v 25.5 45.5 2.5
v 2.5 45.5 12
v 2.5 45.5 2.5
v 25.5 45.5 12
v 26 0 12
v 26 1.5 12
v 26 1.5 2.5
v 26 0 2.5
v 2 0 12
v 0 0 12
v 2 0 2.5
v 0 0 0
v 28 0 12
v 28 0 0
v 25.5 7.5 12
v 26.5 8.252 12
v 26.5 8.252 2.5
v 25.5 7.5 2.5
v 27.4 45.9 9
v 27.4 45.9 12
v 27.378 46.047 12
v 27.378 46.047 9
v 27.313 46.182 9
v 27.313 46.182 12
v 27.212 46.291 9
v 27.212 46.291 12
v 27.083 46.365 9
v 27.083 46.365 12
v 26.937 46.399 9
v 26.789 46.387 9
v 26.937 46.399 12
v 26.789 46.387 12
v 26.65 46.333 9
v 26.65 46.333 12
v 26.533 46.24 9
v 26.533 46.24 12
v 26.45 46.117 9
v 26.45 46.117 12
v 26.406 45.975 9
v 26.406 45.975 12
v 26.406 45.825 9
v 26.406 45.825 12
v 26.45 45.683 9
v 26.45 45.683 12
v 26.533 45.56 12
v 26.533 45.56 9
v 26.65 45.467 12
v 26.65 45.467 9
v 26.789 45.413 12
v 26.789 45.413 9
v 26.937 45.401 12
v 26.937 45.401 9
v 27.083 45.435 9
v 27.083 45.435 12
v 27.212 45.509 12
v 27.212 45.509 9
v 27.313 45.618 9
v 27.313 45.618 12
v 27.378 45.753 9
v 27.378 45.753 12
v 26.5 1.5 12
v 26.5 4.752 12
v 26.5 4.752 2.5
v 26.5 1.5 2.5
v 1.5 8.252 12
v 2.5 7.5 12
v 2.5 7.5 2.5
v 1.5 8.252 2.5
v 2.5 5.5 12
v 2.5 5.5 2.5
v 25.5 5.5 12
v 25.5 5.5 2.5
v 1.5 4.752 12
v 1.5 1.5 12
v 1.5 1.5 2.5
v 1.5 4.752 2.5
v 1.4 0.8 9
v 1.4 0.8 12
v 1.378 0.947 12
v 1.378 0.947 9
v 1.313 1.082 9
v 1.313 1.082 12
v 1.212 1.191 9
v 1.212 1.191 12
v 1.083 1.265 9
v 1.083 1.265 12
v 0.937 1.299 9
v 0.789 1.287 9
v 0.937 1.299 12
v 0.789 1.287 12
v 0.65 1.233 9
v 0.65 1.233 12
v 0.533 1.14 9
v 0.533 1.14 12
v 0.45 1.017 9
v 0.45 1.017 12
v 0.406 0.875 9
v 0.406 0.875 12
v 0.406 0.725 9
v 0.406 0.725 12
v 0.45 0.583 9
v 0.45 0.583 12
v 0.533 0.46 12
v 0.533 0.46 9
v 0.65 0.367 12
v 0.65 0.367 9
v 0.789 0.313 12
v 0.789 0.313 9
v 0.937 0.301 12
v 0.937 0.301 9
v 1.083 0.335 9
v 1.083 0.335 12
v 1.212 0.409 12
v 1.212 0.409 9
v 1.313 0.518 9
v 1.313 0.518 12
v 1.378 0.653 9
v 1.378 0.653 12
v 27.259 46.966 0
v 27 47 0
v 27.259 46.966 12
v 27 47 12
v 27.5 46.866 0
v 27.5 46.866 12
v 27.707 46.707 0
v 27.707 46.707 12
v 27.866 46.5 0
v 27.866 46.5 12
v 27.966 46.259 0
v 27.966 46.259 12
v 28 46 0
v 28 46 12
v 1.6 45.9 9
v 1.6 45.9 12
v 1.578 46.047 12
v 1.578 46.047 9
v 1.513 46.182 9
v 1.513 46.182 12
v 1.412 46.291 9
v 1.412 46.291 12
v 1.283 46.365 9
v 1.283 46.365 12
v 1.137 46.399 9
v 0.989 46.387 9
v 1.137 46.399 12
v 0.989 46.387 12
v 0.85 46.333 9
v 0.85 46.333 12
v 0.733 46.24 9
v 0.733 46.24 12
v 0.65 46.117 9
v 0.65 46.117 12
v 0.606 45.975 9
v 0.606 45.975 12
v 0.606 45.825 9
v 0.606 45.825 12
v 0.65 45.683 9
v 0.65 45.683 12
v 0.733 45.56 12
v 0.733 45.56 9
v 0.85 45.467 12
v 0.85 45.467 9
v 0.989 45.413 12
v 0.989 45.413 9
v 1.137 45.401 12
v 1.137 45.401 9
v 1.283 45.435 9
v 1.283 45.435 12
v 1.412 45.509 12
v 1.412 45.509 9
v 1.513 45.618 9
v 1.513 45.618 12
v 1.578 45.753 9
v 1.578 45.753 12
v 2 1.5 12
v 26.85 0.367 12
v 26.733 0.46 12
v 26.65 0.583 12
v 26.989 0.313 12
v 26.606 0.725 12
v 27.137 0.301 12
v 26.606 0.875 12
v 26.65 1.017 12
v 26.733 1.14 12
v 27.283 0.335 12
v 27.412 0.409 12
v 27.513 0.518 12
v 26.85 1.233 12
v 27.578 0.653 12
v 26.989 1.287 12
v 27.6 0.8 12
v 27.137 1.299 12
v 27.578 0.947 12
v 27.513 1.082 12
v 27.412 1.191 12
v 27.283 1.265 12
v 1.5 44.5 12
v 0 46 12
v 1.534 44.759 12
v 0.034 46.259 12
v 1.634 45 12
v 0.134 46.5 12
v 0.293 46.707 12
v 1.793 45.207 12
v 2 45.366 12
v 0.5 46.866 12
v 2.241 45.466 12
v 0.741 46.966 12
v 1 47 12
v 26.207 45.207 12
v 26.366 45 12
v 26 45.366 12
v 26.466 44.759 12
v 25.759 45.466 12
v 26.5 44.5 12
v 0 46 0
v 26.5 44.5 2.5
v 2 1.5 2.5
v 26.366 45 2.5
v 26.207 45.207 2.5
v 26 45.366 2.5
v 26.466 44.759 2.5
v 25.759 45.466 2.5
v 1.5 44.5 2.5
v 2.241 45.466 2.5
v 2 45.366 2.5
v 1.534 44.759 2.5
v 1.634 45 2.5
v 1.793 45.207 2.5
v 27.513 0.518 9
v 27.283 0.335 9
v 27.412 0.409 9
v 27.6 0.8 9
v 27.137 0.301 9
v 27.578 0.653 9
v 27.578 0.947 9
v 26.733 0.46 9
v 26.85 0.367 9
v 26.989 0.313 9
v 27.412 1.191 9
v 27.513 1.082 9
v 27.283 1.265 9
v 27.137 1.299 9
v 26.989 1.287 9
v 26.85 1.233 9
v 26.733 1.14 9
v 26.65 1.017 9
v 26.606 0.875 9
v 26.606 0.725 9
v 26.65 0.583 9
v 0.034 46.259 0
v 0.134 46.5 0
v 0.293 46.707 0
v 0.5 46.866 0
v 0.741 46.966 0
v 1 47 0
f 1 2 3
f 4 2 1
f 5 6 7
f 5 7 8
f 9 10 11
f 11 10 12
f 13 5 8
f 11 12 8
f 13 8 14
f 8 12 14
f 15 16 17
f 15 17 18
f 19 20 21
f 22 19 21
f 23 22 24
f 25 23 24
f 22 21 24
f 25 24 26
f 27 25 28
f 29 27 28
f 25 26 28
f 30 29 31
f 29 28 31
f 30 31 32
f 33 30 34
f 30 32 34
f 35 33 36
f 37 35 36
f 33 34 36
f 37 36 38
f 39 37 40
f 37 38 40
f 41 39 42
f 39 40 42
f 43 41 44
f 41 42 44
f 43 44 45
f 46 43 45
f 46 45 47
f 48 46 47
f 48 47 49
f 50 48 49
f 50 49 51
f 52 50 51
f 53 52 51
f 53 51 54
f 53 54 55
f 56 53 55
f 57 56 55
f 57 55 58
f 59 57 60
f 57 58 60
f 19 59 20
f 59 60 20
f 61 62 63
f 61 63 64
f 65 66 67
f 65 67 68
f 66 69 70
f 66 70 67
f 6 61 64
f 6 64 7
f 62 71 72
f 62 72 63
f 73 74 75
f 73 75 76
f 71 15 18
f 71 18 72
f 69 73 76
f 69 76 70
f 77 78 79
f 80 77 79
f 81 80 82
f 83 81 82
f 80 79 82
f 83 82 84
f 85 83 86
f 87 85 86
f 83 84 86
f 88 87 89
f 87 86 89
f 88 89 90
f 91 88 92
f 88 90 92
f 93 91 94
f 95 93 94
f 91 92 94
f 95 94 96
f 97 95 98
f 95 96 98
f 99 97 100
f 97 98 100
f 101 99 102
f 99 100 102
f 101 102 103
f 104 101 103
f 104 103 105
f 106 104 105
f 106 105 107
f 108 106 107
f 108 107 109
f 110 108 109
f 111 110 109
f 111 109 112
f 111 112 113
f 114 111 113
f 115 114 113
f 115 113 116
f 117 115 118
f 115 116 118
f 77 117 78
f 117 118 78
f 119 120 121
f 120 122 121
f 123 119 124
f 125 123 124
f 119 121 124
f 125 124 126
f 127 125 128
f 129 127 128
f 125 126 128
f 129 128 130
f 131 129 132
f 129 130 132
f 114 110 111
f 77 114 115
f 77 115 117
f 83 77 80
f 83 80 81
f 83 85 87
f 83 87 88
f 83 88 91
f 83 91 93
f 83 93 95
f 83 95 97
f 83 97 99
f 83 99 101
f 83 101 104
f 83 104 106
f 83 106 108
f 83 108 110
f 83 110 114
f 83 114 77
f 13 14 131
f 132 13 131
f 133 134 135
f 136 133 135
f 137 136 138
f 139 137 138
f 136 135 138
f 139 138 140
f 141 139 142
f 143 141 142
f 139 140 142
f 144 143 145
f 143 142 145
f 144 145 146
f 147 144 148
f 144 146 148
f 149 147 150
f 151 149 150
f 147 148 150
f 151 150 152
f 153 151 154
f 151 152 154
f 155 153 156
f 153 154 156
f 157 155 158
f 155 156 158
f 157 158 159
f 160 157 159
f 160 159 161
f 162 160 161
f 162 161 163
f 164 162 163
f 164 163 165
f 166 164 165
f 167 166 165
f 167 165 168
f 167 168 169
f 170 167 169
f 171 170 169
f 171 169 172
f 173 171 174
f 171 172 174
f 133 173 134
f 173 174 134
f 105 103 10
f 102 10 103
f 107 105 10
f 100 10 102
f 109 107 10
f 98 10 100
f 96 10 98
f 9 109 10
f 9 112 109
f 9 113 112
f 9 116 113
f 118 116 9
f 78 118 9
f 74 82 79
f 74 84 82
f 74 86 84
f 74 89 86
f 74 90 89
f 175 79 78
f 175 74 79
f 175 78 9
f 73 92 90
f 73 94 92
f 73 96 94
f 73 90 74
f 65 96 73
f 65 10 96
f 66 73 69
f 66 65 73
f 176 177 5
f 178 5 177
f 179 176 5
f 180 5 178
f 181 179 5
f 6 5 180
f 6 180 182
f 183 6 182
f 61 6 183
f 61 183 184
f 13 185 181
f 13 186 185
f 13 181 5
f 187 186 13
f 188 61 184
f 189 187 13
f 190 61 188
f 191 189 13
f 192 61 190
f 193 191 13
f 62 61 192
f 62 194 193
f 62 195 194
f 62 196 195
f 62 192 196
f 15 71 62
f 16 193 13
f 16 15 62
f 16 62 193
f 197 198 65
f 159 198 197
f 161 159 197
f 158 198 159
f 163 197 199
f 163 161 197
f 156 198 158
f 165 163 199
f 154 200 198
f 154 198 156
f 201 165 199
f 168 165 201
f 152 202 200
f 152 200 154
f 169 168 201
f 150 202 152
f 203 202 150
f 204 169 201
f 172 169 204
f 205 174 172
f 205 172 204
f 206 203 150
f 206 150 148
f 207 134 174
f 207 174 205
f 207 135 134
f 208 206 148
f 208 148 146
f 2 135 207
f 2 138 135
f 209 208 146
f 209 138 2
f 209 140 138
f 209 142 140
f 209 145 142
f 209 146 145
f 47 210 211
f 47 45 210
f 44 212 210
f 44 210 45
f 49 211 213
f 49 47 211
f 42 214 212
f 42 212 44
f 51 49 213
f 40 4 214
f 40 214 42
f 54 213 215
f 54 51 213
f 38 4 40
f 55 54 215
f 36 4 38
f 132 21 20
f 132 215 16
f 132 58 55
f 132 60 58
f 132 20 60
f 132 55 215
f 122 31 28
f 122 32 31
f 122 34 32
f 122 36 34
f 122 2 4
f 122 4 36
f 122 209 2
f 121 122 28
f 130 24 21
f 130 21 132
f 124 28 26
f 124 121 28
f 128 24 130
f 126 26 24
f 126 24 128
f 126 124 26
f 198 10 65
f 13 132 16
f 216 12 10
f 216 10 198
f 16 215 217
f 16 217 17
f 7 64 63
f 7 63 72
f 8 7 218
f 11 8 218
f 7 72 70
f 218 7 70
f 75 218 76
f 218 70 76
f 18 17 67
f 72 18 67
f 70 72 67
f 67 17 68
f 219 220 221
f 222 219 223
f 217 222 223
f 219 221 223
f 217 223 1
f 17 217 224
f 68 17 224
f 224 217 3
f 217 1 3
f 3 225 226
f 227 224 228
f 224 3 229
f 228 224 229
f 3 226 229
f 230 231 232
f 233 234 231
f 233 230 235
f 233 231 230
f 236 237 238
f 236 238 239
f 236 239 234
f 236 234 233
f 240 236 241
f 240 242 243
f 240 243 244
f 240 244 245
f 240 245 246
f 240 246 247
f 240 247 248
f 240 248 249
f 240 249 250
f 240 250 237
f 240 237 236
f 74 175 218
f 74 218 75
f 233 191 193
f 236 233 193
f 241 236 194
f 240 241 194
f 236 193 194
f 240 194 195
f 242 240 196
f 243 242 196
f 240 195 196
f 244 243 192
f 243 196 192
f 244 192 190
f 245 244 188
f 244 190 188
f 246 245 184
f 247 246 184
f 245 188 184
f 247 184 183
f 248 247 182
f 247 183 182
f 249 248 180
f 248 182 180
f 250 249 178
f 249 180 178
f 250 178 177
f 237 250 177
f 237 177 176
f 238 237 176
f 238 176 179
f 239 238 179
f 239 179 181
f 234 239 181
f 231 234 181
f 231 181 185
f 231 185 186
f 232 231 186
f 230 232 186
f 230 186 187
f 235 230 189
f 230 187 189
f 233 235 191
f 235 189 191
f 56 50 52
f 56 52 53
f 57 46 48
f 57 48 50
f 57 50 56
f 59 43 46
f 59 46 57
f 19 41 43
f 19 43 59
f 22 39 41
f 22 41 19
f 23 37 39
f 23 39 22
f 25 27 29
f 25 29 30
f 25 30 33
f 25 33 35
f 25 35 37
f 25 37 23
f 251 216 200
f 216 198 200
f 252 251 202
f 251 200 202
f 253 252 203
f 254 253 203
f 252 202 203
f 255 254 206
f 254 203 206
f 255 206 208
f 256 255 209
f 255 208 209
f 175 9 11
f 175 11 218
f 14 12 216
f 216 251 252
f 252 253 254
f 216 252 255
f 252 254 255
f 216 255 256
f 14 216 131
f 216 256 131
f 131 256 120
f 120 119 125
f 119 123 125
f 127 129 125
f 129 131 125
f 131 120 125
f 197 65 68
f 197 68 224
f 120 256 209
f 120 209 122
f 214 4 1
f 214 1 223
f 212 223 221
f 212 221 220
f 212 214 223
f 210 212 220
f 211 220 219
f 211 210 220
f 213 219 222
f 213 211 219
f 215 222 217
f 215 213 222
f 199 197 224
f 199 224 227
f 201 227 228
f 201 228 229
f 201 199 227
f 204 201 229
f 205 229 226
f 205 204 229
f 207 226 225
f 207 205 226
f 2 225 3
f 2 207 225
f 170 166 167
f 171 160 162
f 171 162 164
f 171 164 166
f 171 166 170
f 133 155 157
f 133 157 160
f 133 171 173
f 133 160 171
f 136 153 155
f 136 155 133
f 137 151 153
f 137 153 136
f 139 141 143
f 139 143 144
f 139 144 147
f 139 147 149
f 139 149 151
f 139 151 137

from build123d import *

# Parameters (mm, degrees)
SKIZZE1_W                       = 28
SKIZZE1_H                       = 47
AUFSATZ_LINEAR_AUSTRAGEN1_DEPTH = 12
SCHNITT_LINEAR_AUSTRAGEN1_DEPTH = 9.5
VERRUNDUNG2_R                   = 1
SKIZZE3_R                       = 0.5
SCHNITT_LINEAR_AUSTRAGEN2_DEPTH = 3


with BuildPart() as part:
    # Skizze1 → Aufsatz-Linear austragen1 (new body)
    with BuildSketch(Plane.XY):
        with Locations((14, 23.5)):
            Rectangle(SKIZZE1_W, SKIZZE1_H)
    extrude(amount=AUFSATZ_LINEAR_AUSTRAGEN1_DEPTH)

    # Skizze2 → Schnitt-Linear austragen1 (cut)
    with BuildSketch(Plane.XY.offset(12)):
        with BuildLine():
            Line((2.5, 45.5), (25.5, 45.5))
            ThreePointArc((25.5, 45.5), (26.207106781, 45.207106781), (26.5, 44.5))
            Line((26.5, 44.5), (26.5, 8.251904421))
            Line((26.5, 8.251904421), (25.5, 7.5))
            Line((25.5, 7.5), (25.5, 5.5))
            Line((25.5, 5.5), (26.5, 4.751904421))
            Line((26.5, 4.751904421), (26.5, 1.5))
            Line((26.5, 1.5), (26, 1.5))
            Line((26, 1.5), (26, 0))
            Line((26, 0), (2, 0))
            Line((2, 0), (2, 1.5))
            Line((2, 1.5), (1.5, 1.5))
            Line((1.5, 1.5), (1.5, 4.751904421))
            Line((1.5, 4.751904421), (2.5, 5.5))
            Line((2.5, 5.5), (2.5, 7.5))
            Line((2.5, 7.5), (1.5, 8.251904421))
            Line((1.5, 8.251904421), (1.5, 44.5))
            ThreePointArc((1.5, 44.5), (1.792893219, 45.207106781), (2.5, 45.5))
        make_face()
    extrude(amount=-SCHNITT_LINEAR_AUSTRAGEN1_DEPTH, mode=Mode.SUBTRACT)

    # Verrundung2
    verrundung2_edges = [part.edges().sort_by_distance(p)[0] for p in [
        (0, 47, 6),
        (28, 47, 6),
    ]]
    fillet(verrundung2_edges, radius=VERRUNDUNG2_R)

    # Skizze3 → Schnitt-Linear austragen2 (cut)
    with BuildSketch(Plane.XY.offset(12)):
        with Locations((1.1, 45.9)):
            Circle(SKIZZE3_R)
        with Locations((26.9, 45.9)):
            Circle(SKIZZE3_R)
        with Locations((0.9, 0.8)):
            Circle(SKIZZE3_R)
        with Locations((27.1, 0.8)):
            Circle(SKIZZE3_R)
    extrude(amount=-SCHNITT_LINEAR_AUSTRAGEN2_DEPTH, mode=Mode.SUBTRACT)


solid = part.part
